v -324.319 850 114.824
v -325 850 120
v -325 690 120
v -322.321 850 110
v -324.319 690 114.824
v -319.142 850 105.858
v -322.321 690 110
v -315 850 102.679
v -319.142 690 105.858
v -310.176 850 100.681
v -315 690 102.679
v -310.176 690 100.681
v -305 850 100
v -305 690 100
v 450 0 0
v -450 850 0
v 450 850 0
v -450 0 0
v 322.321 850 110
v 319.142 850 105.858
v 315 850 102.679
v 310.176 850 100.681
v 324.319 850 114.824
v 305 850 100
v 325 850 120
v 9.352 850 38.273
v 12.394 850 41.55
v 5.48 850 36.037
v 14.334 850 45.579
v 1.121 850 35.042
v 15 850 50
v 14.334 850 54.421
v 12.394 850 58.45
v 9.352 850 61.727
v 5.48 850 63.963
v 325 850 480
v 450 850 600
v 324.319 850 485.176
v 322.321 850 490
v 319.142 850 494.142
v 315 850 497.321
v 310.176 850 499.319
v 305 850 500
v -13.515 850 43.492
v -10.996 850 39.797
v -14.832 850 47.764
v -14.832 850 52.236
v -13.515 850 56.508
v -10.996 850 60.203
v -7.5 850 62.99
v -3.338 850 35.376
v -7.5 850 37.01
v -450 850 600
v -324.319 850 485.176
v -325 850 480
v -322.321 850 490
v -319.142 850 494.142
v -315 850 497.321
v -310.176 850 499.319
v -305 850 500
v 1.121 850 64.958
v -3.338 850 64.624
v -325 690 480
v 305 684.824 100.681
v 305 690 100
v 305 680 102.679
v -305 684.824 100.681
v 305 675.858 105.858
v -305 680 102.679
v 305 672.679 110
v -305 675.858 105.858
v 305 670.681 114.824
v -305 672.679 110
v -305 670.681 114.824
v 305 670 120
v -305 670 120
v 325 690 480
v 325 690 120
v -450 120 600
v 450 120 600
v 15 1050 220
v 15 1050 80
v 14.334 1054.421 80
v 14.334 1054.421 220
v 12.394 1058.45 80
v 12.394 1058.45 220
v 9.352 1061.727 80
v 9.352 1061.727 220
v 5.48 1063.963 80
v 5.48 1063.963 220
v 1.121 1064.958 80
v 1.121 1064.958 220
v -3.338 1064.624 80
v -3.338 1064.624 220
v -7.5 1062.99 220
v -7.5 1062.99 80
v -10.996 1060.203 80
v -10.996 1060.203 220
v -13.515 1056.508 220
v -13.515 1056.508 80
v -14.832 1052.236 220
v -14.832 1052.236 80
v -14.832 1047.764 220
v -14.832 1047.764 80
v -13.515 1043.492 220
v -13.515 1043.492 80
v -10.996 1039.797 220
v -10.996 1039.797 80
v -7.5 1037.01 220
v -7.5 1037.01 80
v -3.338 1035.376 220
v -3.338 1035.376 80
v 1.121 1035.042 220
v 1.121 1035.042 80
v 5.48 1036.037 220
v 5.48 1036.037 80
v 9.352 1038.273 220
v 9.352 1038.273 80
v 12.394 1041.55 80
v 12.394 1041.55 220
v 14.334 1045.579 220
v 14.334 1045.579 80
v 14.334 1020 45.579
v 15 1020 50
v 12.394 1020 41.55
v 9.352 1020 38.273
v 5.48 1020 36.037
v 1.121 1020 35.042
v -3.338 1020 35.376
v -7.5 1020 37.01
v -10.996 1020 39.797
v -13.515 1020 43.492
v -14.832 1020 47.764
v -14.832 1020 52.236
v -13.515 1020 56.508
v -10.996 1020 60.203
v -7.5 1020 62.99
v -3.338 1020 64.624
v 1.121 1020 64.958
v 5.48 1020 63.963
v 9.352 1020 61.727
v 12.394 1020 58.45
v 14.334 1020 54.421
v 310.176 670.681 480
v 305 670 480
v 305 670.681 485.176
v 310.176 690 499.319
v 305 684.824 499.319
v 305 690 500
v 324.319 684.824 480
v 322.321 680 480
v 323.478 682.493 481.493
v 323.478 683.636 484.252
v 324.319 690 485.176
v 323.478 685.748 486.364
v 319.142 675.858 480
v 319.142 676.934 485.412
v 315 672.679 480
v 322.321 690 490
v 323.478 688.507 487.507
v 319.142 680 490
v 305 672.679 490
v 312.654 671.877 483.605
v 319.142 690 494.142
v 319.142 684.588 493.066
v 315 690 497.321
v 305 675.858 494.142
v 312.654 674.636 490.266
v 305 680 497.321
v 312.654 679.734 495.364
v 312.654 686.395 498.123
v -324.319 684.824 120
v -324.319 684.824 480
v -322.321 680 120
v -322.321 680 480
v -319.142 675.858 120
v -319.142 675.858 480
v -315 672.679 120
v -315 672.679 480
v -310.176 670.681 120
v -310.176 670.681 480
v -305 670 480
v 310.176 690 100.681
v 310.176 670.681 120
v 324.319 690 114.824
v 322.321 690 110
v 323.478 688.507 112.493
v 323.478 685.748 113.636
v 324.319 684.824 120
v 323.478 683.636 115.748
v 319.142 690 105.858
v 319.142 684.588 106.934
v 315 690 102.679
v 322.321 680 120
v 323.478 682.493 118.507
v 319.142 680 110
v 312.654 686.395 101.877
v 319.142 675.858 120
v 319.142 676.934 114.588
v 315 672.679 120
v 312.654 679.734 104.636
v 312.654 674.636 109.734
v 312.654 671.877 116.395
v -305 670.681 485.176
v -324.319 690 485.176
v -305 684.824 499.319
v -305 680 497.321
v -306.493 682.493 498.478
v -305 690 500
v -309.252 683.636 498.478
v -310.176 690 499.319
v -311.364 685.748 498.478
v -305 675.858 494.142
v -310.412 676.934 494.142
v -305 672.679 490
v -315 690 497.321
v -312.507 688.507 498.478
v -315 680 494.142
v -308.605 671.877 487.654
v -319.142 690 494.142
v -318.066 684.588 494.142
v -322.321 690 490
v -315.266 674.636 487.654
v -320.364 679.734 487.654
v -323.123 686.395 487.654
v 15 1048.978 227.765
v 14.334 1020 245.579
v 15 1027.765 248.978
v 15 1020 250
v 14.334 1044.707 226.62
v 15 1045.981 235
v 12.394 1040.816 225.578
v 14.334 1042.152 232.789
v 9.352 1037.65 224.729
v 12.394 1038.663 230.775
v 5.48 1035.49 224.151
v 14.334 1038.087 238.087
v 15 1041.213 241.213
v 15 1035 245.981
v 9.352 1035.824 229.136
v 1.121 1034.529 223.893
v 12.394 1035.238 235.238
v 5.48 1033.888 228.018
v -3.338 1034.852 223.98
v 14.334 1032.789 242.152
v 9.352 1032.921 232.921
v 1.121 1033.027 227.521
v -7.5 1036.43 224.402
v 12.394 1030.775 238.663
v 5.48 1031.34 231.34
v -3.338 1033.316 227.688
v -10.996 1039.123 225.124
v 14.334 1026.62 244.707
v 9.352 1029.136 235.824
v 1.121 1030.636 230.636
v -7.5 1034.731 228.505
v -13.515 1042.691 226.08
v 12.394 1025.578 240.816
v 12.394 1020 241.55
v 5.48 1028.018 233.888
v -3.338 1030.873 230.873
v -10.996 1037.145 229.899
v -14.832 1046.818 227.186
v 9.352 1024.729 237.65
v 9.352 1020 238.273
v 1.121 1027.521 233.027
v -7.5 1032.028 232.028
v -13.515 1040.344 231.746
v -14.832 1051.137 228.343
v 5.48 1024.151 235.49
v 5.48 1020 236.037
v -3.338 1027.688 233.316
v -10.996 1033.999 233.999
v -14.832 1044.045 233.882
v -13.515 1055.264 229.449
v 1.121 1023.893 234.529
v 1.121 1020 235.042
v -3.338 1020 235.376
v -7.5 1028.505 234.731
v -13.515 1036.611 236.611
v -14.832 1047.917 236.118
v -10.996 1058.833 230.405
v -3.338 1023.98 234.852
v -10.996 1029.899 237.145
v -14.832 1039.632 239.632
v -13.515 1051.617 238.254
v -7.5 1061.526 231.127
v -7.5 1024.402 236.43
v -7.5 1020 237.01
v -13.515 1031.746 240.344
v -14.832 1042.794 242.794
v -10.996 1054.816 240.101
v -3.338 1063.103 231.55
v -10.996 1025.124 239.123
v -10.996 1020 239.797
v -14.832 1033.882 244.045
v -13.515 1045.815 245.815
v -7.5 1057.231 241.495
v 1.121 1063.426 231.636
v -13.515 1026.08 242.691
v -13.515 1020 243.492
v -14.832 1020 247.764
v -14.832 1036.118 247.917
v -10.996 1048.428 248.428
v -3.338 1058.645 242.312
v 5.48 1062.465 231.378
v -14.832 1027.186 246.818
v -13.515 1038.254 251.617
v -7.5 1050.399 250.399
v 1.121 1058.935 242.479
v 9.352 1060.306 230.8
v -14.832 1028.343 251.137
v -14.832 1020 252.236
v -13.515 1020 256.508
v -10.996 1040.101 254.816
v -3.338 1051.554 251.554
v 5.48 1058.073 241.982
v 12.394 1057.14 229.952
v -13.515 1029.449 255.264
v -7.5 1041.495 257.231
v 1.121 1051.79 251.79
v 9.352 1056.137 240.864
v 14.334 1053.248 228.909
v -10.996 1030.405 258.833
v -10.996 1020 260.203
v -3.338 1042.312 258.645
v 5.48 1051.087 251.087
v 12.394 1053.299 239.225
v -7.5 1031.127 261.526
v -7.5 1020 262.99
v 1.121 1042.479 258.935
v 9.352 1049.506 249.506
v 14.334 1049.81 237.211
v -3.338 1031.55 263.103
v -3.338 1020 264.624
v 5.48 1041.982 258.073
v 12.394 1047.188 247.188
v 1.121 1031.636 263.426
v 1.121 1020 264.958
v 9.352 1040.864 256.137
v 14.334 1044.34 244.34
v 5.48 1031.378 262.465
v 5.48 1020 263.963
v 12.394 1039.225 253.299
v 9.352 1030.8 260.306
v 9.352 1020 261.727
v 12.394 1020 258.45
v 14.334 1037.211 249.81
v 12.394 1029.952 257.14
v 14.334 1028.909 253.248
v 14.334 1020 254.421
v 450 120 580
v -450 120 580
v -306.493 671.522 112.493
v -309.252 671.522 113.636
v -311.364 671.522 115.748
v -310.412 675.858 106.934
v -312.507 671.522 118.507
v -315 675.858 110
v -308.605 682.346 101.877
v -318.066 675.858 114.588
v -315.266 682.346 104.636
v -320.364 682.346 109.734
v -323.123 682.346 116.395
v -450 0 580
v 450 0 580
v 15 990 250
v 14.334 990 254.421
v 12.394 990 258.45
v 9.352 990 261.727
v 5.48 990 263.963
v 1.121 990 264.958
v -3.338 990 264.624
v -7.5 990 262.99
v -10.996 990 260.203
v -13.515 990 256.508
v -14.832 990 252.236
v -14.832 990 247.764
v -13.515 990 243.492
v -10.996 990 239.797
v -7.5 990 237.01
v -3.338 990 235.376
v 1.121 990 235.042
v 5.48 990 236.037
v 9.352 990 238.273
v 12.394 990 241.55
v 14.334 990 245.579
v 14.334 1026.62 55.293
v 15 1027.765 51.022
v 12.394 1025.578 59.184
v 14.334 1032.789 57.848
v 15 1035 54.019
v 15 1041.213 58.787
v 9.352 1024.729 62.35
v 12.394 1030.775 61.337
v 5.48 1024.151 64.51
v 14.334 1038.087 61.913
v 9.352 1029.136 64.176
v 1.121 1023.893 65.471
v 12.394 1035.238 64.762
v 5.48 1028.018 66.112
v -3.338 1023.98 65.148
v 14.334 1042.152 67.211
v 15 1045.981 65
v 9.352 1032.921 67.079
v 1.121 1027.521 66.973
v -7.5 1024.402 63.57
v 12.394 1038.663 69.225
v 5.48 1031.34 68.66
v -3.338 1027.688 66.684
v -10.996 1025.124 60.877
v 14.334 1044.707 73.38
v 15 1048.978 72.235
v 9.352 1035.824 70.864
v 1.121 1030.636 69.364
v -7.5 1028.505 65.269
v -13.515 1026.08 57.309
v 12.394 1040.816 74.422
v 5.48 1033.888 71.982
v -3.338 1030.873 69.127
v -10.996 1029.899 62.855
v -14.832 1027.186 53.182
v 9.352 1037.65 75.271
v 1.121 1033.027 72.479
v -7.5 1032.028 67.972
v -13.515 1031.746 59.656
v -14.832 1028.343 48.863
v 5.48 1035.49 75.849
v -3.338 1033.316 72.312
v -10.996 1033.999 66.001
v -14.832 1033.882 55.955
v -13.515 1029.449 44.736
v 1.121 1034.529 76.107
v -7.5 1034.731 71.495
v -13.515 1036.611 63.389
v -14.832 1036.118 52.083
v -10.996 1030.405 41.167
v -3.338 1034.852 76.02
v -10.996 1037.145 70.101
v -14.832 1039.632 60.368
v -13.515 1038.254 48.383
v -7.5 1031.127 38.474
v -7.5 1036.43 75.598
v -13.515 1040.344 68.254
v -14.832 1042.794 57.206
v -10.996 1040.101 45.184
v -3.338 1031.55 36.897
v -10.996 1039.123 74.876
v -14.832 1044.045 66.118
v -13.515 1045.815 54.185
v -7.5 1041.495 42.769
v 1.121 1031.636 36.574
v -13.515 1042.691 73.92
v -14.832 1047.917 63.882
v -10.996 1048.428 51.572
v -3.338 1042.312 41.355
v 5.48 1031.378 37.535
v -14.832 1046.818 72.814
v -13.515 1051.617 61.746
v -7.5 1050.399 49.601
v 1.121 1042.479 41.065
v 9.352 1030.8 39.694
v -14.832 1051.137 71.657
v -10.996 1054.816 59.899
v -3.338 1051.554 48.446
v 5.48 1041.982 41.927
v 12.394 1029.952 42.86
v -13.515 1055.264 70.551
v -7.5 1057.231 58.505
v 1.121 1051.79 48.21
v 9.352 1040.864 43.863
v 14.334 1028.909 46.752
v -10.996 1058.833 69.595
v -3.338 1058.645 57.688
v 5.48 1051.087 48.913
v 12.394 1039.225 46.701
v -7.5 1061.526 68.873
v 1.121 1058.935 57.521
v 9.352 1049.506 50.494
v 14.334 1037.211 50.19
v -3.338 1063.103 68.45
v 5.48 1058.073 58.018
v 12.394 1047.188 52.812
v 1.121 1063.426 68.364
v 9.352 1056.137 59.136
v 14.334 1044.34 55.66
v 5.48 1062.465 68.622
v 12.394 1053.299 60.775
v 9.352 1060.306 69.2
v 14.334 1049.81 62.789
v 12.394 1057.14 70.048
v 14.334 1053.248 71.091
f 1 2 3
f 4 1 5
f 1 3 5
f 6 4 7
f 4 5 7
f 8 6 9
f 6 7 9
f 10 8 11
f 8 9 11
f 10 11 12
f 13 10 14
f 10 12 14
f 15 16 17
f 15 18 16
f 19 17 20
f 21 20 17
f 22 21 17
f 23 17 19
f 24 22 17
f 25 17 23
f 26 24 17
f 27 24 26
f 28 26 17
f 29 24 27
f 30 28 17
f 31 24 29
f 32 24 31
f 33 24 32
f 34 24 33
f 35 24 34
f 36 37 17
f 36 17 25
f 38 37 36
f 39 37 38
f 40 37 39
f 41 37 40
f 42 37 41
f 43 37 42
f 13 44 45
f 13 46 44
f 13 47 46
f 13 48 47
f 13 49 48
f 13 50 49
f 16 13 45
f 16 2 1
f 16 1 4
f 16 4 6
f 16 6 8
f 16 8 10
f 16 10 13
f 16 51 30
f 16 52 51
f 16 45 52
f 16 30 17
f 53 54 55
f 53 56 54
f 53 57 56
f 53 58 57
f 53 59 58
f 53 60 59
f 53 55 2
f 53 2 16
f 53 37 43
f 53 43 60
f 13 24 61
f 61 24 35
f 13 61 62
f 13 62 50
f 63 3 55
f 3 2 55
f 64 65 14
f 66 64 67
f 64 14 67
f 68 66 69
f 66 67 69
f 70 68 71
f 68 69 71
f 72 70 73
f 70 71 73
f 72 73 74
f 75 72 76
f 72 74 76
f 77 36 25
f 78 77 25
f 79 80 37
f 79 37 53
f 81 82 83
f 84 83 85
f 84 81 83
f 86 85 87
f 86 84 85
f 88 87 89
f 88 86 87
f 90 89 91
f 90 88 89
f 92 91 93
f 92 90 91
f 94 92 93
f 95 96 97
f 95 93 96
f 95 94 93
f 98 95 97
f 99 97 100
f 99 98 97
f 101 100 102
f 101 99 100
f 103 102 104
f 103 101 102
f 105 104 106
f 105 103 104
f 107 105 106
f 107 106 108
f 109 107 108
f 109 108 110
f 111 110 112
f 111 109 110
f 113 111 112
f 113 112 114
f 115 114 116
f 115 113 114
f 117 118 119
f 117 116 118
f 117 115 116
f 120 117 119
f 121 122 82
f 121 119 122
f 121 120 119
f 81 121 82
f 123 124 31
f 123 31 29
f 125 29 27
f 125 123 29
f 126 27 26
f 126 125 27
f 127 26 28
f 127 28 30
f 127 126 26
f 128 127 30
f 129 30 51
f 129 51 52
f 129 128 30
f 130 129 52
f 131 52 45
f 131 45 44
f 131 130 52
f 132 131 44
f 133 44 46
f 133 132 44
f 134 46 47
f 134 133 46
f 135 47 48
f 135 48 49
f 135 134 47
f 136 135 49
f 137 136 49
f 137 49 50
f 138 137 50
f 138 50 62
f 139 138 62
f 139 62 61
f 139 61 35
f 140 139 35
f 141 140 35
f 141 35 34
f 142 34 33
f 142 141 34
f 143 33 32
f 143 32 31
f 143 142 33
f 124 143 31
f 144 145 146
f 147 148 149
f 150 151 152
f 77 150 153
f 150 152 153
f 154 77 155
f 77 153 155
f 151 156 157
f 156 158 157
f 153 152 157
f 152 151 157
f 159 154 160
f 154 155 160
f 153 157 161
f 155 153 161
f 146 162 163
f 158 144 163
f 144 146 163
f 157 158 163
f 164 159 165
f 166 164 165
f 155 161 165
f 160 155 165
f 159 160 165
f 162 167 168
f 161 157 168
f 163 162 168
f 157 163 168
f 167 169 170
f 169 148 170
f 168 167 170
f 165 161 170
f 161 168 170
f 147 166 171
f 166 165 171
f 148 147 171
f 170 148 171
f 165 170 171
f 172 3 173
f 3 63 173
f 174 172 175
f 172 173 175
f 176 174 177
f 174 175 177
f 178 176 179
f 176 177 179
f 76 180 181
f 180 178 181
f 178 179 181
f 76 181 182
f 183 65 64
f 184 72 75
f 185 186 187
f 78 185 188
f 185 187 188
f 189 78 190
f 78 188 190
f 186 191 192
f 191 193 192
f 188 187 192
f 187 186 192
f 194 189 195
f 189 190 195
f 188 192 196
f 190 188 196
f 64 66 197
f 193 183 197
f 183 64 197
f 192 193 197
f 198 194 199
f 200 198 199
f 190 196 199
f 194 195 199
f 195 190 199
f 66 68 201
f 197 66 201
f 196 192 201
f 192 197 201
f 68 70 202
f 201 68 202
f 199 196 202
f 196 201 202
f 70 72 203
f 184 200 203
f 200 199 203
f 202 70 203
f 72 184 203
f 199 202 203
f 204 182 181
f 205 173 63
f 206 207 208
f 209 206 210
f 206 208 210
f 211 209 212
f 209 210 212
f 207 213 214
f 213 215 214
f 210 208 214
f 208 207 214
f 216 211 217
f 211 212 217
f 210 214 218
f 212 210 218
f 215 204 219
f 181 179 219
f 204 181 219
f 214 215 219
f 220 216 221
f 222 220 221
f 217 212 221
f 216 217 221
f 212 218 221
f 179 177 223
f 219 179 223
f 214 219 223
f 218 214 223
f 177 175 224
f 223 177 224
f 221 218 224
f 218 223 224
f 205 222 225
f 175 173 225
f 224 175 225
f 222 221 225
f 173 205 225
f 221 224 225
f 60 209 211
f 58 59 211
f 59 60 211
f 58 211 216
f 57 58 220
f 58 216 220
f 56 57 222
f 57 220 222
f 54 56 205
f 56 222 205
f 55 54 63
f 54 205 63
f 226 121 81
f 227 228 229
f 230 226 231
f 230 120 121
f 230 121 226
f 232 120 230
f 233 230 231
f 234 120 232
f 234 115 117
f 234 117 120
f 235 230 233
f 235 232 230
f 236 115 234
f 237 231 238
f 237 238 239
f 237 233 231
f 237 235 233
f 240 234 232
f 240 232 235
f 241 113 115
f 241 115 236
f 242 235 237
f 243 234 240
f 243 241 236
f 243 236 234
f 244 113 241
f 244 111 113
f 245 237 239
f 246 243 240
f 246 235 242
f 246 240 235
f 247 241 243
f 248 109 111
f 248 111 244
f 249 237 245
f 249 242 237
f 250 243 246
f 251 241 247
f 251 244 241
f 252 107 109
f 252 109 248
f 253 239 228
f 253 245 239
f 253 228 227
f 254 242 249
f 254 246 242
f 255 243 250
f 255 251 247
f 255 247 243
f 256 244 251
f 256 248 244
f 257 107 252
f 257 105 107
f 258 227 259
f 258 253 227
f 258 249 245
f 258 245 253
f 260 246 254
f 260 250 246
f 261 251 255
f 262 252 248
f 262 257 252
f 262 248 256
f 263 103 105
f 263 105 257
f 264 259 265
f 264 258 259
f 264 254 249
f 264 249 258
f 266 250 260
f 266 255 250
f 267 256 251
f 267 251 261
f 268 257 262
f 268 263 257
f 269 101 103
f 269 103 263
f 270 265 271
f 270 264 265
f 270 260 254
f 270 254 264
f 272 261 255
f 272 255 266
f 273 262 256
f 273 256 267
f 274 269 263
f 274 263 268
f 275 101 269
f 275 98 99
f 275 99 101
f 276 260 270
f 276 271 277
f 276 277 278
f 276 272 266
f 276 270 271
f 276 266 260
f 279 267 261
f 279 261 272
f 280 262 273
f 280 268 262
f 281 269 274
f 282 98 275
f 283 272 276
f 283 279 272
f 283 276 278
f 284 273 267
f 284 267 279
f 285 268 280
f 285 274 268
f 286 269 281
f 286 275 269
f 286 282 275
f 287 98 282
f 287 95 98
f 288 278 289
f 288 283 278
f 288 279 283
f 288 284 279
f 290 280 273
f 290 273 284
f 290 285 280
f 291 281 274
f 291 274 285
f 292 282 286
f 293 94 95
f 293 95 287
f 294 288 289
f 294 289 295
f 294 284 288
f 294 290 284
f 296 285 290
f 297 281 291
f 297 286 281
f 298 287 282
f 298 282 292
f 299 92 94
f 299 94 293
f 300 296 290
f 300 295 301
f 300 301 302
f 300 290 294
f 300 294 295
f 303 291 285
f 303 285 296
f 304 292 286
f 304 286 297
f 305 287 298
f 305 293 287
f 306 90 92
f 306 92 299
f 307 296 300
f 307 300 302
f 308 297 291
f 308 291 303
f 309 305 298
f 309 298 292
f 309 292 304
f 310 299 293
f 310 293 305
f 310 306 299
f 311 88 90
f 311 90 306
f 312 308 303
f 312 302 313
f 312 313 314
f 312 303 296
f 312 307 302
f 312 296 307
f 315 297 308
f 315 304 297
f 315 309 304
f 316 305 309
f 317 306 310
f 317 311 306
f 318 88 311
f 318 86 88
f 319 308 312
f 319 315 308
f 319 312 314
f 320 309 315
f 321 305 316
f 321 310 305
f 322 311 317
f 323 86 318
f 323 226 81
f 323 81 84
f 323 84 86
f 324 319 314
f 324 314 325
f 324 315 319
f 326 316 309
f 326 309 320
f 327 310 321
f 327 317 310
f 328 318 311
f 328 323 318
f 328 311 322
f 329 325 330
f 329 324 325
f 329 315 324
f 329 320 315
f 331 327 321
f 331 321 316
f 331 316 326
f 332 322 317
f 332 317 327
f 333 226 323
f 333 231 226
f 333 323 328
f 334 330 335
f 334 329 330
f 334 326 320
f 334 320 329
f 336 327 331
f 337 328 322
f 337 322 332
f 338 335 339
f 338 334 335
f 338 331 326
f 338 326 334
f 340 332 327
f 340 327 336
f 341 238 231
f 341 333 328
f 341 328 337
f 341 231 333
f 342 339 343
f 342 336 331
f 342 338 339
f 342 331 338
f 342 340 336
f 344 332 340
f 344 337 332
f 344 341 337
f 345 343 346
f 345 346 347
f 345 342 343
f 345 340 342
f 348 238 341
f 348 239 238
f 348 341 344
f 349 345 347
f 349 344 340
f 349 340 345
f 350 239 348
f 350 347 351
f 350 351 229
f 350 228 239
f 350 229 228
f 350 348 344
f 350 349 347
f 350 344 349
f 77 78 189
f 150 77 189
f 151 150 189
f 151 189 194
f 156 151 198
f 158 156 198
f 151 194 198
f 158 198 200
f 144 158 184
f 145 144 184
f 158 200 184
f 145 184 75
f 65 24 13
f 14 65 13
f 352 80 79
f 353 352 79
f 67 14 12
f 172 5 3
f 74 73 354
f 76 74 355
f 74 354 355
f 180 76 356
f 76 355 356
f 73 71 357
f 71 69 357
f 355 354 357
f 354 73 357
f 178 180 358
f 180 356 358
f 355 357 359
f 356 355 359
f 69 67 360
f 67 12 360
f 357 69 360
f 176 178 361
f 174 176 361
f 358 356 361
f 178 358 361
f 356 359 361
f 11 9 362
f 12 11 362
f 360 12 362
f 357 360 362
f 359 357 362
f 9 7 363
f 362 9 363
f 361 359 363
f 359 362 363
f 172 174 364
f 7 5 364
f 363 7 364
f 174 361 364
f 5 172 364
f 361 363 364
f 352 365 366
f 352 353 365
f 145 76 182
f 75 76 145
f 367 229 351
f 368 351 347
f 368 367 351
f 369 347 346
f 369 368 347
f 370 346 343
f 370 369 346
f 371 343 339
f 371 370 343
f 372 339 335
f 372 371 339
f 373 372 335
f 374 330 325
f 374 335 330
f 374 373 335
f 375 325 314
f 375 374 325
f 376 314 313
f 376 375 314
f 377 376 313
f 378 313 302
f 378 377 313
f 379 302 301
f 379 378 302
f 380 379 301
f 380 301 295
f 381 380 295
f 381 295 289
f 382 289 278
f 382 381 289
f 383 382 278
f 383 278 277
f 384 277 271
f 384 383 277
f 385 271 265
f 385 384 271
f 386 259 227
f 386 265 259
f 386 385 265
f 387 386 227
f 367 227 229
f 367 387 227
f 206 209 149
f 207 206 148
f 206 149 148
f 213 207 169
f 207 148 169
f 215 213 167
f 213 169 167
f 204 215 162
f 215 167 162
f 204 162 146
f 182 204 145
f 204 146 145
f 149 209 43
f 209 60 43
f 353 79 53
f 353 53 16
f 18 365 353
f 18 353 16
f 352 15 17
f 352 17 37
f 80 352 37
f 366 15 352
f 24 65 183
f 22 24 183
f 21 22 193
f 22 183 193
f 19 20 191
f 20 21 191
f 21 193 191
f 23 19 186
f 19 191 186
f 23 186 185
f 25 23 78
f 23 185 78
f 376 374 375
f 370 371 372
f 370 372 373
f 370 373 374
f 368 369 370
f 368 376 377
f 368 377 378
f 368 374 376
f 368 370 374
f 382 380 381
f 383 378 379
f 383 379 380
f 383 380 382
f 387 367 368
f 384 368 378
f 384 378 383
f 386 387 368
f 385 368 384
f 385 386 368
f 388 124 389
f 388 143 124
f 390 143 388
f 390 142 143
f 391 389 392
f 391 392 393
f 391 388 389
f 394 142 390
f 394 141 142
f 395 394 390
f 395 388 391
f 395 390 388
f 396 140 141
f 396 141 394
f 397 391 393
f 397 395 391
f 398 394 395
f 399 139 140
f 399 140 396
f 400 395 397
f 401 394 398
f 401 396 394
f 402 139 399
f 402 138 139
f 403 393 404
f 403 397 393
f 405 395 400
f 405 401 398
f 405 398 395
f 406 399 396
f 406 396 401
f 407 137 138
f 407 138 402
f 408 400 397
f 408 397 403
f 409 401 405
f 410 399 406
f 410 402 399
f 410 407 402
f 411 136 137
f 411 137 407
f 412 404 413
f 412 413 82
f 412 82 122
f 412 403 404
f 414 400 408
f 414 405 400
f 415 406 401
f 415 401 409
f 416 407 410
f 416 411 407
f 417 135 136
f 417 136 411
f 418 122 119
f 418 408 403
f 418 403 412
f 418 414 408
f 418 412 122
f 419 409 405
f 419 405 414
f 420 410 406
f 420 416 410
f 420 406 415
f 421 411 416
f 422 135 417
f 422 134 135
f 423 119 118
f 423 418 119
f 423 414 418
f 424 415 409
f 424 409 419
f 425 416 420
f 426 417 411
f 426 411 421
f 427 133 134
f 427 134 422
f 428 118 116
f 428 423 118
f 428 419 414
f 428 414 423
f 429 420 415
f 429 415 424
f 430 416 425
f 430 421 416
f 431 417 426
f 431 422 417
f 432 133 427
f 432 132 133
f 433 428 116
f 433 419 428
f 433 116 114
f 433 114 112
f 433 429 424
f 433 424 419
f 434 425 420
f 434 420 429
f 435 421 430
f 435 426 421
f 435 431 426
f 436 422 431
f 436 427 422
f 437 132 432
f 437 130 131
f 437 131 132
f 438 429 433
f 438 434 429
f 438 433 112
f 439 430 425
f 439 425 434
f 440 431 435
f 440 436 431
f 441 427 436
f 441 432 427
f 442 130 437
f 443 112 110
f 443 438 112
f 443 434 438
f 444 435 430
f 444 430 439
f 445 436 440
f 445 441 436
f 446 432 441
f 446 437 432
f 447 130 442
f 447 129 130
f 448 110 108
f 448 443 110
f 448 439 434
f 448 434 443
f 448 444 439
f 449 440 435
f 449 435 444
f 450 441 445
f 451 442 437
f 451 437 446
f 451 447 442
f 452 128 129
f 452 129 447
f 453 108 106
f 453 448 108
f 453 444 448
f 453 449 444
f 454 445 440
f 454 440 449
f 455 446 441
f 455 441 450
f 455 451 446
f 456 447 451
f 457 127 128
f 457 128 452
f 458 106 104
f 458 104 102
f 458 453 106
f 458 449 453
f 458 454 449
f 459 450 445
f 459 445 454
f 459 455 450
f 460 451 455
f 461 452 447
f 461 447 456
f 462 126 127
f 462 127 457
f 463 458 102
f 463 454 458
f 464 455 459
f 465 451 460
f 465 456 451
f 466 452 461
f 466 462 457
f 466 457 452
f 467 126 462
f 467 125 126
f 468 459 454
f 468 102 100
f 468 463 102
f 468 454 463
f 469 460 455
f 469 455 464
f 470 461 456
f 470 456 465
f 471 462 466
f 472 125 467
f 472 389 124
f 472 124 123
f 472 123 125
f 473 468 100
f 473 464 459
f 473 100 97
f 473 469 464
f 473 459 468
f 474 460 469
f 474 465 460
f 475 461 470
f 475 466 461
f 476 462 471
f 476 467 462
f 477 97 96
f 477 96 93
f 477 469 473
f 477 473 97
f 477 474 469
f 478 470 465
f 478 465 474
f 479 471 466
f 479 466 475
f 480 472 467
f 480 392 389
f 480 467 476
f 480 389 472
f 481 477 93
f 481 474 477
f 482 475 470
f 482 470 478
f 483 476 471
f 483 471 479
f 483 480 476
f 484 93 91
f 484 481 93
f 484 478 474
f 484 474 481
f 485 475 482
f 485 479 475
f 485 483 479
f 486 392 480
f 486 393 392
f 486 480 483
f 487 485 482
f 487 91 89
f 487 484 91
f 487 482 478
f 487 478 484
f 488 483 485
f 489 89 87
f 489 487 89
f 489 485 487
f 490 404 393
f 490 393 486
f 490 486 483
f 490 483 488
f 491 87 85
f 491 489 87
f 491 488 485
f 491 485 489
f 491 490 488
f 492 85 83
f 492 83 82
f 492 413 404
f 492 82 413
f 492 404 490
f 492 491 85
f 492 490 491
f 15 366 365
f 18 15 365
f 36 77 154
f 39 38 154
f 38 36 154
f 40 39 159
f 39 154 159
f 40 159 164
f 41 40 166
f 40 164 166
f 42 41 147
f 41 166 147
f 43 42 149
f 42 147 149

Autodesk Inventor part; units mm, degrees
ref_plane "YZ Plane" through (0, 0, 0) normal (1, 0, 0) x (0, 1, 0)
ref_plane "XZ Plane" through (0, 0, 0) normal (0, 1, 0) x (-1, 0, 0)
ref_plane "XY Plane" through (0, 0, 0) normal (0, 0, 1) x (1, 0, 0)
sketch "Sketch1" plane through (0, 0, 0) normal (0, 1, 0) x (-1, 0, 0)
  line L0 (450, 0) -> (-450, 0)
  line L1 (-450, 0) -> (-450, 600)
  line L2 (-450, 600) -> (450, 600)
  line L3 (450, 600) -> (450, 0)
  point P0 (0, 0)
  point P1 (0, 0)
  dimension "d0" = 900
  dimension "d1" = 600
extrude "Extrusion1" add sketch "Sketch1" along normal blind 850
sketch "Sketch2" plane through (0, 850, 0) normal (0, 1, 0) x (1, 0, 0)
  line L0 (-325, -500) -> (325, -500)
  line L1 (325, -500) -> (325, -100)
  line L2 (325, -100) -> (-325, -100)
  line L3 (-325, -100) -> (-325, -500)
  line L4 (-325, -500) -> (325, -100) construction
  line L5 (325, -500) -> (-325, -100) construction
  line L6 (-450, 0) -> (-450, -600) projected
  line L7 (-450, -600) -> (450, -600) projected
  point P0 (0, 0)
  point P1 (0, -300)
  point P2 (-450, -300)
  point P3 (-450, -300)
  point P4 (0, -600)
  dimension "d4" = 650
  dimension "d5" = 400
extrude "Extrusion2" cut sketch "Sketch2" against normal blind 180
fillet "Fillet1" radius 20 8 edges at (-325, 760, 100) (-325, 670, 300) (0, 670, 100) (-325, 760, 500) (0, 670, 500) (325, 670, 300) (325, 760, 500) (325, 760, 100)
sketch "Sketch3" plane through (-450, 0, 600) normal (0, 0, 1) x (1, 0, 0)
  line L0 (0, 0) -> (900, 0) projected
  line L1 (900, 0) -> (900, 850) projected
  line L2 (0, 0) -> (900, 0)
  line L3 (900, 0) -> (900, 120)
  line L4 (900, 120) -> (0, 120)
  line L5 (0, 120) -> (0, 0)
  point P0 (450, 0)
  dimension "d9" = 120
extrude "Extrusion3" cut sketch "Sketch3" against normal blind 20
sketch "Sketch4" plane through (0, 0, 0) normal (1, 0, 0) x (0, 1, 0)
  line L0 (850, 50) -> (1020, 50)
  arc A0 (1020, 50) -> (1050, 80) centre (1020, 80) ccw
  line L1 (1050, 80) -> (1050, 220)
  arc A1 (1050, 220) -> (1020, 250) centre (1020, 220) ccw
  line L2 (1020, 250) -> (990, 250)
  line L3 (850, 600) -> (850, 0) projected
  line L4 (850, 0) -> (850, 600) projected
  line L5 (850, 120) -> (850, 100) projected
  line L6 (850, 120) -> (850, 480) projected
  line L7 (850, 500) -> (850, 480) projected
  line L8 (850, 480) -> (850, 500) projected
  line L9 (850, 480) -> (850, 120) projected
  line L10 (850, 100) -> (850, 120) projected
  point P0 (0, 0)
  dimension "d12" = 60
  dimension "d13" = 200
  dimension "d14" = 50
  dimension "d16" = 30
sketch "Sketch5" plane through (0, 850, 0) normal (0, 1, 0) x (1, 0, 0)
  circle A0 centre (0, -50) radius 15
  point P0 (0, 0)
  dimension "d17" = 30
sweep "Sweep1" add profiles "Sketch5" path "Sketch4" path curves L0 A0 L1 A1 L2
properties part number "Mobile lavandino"
